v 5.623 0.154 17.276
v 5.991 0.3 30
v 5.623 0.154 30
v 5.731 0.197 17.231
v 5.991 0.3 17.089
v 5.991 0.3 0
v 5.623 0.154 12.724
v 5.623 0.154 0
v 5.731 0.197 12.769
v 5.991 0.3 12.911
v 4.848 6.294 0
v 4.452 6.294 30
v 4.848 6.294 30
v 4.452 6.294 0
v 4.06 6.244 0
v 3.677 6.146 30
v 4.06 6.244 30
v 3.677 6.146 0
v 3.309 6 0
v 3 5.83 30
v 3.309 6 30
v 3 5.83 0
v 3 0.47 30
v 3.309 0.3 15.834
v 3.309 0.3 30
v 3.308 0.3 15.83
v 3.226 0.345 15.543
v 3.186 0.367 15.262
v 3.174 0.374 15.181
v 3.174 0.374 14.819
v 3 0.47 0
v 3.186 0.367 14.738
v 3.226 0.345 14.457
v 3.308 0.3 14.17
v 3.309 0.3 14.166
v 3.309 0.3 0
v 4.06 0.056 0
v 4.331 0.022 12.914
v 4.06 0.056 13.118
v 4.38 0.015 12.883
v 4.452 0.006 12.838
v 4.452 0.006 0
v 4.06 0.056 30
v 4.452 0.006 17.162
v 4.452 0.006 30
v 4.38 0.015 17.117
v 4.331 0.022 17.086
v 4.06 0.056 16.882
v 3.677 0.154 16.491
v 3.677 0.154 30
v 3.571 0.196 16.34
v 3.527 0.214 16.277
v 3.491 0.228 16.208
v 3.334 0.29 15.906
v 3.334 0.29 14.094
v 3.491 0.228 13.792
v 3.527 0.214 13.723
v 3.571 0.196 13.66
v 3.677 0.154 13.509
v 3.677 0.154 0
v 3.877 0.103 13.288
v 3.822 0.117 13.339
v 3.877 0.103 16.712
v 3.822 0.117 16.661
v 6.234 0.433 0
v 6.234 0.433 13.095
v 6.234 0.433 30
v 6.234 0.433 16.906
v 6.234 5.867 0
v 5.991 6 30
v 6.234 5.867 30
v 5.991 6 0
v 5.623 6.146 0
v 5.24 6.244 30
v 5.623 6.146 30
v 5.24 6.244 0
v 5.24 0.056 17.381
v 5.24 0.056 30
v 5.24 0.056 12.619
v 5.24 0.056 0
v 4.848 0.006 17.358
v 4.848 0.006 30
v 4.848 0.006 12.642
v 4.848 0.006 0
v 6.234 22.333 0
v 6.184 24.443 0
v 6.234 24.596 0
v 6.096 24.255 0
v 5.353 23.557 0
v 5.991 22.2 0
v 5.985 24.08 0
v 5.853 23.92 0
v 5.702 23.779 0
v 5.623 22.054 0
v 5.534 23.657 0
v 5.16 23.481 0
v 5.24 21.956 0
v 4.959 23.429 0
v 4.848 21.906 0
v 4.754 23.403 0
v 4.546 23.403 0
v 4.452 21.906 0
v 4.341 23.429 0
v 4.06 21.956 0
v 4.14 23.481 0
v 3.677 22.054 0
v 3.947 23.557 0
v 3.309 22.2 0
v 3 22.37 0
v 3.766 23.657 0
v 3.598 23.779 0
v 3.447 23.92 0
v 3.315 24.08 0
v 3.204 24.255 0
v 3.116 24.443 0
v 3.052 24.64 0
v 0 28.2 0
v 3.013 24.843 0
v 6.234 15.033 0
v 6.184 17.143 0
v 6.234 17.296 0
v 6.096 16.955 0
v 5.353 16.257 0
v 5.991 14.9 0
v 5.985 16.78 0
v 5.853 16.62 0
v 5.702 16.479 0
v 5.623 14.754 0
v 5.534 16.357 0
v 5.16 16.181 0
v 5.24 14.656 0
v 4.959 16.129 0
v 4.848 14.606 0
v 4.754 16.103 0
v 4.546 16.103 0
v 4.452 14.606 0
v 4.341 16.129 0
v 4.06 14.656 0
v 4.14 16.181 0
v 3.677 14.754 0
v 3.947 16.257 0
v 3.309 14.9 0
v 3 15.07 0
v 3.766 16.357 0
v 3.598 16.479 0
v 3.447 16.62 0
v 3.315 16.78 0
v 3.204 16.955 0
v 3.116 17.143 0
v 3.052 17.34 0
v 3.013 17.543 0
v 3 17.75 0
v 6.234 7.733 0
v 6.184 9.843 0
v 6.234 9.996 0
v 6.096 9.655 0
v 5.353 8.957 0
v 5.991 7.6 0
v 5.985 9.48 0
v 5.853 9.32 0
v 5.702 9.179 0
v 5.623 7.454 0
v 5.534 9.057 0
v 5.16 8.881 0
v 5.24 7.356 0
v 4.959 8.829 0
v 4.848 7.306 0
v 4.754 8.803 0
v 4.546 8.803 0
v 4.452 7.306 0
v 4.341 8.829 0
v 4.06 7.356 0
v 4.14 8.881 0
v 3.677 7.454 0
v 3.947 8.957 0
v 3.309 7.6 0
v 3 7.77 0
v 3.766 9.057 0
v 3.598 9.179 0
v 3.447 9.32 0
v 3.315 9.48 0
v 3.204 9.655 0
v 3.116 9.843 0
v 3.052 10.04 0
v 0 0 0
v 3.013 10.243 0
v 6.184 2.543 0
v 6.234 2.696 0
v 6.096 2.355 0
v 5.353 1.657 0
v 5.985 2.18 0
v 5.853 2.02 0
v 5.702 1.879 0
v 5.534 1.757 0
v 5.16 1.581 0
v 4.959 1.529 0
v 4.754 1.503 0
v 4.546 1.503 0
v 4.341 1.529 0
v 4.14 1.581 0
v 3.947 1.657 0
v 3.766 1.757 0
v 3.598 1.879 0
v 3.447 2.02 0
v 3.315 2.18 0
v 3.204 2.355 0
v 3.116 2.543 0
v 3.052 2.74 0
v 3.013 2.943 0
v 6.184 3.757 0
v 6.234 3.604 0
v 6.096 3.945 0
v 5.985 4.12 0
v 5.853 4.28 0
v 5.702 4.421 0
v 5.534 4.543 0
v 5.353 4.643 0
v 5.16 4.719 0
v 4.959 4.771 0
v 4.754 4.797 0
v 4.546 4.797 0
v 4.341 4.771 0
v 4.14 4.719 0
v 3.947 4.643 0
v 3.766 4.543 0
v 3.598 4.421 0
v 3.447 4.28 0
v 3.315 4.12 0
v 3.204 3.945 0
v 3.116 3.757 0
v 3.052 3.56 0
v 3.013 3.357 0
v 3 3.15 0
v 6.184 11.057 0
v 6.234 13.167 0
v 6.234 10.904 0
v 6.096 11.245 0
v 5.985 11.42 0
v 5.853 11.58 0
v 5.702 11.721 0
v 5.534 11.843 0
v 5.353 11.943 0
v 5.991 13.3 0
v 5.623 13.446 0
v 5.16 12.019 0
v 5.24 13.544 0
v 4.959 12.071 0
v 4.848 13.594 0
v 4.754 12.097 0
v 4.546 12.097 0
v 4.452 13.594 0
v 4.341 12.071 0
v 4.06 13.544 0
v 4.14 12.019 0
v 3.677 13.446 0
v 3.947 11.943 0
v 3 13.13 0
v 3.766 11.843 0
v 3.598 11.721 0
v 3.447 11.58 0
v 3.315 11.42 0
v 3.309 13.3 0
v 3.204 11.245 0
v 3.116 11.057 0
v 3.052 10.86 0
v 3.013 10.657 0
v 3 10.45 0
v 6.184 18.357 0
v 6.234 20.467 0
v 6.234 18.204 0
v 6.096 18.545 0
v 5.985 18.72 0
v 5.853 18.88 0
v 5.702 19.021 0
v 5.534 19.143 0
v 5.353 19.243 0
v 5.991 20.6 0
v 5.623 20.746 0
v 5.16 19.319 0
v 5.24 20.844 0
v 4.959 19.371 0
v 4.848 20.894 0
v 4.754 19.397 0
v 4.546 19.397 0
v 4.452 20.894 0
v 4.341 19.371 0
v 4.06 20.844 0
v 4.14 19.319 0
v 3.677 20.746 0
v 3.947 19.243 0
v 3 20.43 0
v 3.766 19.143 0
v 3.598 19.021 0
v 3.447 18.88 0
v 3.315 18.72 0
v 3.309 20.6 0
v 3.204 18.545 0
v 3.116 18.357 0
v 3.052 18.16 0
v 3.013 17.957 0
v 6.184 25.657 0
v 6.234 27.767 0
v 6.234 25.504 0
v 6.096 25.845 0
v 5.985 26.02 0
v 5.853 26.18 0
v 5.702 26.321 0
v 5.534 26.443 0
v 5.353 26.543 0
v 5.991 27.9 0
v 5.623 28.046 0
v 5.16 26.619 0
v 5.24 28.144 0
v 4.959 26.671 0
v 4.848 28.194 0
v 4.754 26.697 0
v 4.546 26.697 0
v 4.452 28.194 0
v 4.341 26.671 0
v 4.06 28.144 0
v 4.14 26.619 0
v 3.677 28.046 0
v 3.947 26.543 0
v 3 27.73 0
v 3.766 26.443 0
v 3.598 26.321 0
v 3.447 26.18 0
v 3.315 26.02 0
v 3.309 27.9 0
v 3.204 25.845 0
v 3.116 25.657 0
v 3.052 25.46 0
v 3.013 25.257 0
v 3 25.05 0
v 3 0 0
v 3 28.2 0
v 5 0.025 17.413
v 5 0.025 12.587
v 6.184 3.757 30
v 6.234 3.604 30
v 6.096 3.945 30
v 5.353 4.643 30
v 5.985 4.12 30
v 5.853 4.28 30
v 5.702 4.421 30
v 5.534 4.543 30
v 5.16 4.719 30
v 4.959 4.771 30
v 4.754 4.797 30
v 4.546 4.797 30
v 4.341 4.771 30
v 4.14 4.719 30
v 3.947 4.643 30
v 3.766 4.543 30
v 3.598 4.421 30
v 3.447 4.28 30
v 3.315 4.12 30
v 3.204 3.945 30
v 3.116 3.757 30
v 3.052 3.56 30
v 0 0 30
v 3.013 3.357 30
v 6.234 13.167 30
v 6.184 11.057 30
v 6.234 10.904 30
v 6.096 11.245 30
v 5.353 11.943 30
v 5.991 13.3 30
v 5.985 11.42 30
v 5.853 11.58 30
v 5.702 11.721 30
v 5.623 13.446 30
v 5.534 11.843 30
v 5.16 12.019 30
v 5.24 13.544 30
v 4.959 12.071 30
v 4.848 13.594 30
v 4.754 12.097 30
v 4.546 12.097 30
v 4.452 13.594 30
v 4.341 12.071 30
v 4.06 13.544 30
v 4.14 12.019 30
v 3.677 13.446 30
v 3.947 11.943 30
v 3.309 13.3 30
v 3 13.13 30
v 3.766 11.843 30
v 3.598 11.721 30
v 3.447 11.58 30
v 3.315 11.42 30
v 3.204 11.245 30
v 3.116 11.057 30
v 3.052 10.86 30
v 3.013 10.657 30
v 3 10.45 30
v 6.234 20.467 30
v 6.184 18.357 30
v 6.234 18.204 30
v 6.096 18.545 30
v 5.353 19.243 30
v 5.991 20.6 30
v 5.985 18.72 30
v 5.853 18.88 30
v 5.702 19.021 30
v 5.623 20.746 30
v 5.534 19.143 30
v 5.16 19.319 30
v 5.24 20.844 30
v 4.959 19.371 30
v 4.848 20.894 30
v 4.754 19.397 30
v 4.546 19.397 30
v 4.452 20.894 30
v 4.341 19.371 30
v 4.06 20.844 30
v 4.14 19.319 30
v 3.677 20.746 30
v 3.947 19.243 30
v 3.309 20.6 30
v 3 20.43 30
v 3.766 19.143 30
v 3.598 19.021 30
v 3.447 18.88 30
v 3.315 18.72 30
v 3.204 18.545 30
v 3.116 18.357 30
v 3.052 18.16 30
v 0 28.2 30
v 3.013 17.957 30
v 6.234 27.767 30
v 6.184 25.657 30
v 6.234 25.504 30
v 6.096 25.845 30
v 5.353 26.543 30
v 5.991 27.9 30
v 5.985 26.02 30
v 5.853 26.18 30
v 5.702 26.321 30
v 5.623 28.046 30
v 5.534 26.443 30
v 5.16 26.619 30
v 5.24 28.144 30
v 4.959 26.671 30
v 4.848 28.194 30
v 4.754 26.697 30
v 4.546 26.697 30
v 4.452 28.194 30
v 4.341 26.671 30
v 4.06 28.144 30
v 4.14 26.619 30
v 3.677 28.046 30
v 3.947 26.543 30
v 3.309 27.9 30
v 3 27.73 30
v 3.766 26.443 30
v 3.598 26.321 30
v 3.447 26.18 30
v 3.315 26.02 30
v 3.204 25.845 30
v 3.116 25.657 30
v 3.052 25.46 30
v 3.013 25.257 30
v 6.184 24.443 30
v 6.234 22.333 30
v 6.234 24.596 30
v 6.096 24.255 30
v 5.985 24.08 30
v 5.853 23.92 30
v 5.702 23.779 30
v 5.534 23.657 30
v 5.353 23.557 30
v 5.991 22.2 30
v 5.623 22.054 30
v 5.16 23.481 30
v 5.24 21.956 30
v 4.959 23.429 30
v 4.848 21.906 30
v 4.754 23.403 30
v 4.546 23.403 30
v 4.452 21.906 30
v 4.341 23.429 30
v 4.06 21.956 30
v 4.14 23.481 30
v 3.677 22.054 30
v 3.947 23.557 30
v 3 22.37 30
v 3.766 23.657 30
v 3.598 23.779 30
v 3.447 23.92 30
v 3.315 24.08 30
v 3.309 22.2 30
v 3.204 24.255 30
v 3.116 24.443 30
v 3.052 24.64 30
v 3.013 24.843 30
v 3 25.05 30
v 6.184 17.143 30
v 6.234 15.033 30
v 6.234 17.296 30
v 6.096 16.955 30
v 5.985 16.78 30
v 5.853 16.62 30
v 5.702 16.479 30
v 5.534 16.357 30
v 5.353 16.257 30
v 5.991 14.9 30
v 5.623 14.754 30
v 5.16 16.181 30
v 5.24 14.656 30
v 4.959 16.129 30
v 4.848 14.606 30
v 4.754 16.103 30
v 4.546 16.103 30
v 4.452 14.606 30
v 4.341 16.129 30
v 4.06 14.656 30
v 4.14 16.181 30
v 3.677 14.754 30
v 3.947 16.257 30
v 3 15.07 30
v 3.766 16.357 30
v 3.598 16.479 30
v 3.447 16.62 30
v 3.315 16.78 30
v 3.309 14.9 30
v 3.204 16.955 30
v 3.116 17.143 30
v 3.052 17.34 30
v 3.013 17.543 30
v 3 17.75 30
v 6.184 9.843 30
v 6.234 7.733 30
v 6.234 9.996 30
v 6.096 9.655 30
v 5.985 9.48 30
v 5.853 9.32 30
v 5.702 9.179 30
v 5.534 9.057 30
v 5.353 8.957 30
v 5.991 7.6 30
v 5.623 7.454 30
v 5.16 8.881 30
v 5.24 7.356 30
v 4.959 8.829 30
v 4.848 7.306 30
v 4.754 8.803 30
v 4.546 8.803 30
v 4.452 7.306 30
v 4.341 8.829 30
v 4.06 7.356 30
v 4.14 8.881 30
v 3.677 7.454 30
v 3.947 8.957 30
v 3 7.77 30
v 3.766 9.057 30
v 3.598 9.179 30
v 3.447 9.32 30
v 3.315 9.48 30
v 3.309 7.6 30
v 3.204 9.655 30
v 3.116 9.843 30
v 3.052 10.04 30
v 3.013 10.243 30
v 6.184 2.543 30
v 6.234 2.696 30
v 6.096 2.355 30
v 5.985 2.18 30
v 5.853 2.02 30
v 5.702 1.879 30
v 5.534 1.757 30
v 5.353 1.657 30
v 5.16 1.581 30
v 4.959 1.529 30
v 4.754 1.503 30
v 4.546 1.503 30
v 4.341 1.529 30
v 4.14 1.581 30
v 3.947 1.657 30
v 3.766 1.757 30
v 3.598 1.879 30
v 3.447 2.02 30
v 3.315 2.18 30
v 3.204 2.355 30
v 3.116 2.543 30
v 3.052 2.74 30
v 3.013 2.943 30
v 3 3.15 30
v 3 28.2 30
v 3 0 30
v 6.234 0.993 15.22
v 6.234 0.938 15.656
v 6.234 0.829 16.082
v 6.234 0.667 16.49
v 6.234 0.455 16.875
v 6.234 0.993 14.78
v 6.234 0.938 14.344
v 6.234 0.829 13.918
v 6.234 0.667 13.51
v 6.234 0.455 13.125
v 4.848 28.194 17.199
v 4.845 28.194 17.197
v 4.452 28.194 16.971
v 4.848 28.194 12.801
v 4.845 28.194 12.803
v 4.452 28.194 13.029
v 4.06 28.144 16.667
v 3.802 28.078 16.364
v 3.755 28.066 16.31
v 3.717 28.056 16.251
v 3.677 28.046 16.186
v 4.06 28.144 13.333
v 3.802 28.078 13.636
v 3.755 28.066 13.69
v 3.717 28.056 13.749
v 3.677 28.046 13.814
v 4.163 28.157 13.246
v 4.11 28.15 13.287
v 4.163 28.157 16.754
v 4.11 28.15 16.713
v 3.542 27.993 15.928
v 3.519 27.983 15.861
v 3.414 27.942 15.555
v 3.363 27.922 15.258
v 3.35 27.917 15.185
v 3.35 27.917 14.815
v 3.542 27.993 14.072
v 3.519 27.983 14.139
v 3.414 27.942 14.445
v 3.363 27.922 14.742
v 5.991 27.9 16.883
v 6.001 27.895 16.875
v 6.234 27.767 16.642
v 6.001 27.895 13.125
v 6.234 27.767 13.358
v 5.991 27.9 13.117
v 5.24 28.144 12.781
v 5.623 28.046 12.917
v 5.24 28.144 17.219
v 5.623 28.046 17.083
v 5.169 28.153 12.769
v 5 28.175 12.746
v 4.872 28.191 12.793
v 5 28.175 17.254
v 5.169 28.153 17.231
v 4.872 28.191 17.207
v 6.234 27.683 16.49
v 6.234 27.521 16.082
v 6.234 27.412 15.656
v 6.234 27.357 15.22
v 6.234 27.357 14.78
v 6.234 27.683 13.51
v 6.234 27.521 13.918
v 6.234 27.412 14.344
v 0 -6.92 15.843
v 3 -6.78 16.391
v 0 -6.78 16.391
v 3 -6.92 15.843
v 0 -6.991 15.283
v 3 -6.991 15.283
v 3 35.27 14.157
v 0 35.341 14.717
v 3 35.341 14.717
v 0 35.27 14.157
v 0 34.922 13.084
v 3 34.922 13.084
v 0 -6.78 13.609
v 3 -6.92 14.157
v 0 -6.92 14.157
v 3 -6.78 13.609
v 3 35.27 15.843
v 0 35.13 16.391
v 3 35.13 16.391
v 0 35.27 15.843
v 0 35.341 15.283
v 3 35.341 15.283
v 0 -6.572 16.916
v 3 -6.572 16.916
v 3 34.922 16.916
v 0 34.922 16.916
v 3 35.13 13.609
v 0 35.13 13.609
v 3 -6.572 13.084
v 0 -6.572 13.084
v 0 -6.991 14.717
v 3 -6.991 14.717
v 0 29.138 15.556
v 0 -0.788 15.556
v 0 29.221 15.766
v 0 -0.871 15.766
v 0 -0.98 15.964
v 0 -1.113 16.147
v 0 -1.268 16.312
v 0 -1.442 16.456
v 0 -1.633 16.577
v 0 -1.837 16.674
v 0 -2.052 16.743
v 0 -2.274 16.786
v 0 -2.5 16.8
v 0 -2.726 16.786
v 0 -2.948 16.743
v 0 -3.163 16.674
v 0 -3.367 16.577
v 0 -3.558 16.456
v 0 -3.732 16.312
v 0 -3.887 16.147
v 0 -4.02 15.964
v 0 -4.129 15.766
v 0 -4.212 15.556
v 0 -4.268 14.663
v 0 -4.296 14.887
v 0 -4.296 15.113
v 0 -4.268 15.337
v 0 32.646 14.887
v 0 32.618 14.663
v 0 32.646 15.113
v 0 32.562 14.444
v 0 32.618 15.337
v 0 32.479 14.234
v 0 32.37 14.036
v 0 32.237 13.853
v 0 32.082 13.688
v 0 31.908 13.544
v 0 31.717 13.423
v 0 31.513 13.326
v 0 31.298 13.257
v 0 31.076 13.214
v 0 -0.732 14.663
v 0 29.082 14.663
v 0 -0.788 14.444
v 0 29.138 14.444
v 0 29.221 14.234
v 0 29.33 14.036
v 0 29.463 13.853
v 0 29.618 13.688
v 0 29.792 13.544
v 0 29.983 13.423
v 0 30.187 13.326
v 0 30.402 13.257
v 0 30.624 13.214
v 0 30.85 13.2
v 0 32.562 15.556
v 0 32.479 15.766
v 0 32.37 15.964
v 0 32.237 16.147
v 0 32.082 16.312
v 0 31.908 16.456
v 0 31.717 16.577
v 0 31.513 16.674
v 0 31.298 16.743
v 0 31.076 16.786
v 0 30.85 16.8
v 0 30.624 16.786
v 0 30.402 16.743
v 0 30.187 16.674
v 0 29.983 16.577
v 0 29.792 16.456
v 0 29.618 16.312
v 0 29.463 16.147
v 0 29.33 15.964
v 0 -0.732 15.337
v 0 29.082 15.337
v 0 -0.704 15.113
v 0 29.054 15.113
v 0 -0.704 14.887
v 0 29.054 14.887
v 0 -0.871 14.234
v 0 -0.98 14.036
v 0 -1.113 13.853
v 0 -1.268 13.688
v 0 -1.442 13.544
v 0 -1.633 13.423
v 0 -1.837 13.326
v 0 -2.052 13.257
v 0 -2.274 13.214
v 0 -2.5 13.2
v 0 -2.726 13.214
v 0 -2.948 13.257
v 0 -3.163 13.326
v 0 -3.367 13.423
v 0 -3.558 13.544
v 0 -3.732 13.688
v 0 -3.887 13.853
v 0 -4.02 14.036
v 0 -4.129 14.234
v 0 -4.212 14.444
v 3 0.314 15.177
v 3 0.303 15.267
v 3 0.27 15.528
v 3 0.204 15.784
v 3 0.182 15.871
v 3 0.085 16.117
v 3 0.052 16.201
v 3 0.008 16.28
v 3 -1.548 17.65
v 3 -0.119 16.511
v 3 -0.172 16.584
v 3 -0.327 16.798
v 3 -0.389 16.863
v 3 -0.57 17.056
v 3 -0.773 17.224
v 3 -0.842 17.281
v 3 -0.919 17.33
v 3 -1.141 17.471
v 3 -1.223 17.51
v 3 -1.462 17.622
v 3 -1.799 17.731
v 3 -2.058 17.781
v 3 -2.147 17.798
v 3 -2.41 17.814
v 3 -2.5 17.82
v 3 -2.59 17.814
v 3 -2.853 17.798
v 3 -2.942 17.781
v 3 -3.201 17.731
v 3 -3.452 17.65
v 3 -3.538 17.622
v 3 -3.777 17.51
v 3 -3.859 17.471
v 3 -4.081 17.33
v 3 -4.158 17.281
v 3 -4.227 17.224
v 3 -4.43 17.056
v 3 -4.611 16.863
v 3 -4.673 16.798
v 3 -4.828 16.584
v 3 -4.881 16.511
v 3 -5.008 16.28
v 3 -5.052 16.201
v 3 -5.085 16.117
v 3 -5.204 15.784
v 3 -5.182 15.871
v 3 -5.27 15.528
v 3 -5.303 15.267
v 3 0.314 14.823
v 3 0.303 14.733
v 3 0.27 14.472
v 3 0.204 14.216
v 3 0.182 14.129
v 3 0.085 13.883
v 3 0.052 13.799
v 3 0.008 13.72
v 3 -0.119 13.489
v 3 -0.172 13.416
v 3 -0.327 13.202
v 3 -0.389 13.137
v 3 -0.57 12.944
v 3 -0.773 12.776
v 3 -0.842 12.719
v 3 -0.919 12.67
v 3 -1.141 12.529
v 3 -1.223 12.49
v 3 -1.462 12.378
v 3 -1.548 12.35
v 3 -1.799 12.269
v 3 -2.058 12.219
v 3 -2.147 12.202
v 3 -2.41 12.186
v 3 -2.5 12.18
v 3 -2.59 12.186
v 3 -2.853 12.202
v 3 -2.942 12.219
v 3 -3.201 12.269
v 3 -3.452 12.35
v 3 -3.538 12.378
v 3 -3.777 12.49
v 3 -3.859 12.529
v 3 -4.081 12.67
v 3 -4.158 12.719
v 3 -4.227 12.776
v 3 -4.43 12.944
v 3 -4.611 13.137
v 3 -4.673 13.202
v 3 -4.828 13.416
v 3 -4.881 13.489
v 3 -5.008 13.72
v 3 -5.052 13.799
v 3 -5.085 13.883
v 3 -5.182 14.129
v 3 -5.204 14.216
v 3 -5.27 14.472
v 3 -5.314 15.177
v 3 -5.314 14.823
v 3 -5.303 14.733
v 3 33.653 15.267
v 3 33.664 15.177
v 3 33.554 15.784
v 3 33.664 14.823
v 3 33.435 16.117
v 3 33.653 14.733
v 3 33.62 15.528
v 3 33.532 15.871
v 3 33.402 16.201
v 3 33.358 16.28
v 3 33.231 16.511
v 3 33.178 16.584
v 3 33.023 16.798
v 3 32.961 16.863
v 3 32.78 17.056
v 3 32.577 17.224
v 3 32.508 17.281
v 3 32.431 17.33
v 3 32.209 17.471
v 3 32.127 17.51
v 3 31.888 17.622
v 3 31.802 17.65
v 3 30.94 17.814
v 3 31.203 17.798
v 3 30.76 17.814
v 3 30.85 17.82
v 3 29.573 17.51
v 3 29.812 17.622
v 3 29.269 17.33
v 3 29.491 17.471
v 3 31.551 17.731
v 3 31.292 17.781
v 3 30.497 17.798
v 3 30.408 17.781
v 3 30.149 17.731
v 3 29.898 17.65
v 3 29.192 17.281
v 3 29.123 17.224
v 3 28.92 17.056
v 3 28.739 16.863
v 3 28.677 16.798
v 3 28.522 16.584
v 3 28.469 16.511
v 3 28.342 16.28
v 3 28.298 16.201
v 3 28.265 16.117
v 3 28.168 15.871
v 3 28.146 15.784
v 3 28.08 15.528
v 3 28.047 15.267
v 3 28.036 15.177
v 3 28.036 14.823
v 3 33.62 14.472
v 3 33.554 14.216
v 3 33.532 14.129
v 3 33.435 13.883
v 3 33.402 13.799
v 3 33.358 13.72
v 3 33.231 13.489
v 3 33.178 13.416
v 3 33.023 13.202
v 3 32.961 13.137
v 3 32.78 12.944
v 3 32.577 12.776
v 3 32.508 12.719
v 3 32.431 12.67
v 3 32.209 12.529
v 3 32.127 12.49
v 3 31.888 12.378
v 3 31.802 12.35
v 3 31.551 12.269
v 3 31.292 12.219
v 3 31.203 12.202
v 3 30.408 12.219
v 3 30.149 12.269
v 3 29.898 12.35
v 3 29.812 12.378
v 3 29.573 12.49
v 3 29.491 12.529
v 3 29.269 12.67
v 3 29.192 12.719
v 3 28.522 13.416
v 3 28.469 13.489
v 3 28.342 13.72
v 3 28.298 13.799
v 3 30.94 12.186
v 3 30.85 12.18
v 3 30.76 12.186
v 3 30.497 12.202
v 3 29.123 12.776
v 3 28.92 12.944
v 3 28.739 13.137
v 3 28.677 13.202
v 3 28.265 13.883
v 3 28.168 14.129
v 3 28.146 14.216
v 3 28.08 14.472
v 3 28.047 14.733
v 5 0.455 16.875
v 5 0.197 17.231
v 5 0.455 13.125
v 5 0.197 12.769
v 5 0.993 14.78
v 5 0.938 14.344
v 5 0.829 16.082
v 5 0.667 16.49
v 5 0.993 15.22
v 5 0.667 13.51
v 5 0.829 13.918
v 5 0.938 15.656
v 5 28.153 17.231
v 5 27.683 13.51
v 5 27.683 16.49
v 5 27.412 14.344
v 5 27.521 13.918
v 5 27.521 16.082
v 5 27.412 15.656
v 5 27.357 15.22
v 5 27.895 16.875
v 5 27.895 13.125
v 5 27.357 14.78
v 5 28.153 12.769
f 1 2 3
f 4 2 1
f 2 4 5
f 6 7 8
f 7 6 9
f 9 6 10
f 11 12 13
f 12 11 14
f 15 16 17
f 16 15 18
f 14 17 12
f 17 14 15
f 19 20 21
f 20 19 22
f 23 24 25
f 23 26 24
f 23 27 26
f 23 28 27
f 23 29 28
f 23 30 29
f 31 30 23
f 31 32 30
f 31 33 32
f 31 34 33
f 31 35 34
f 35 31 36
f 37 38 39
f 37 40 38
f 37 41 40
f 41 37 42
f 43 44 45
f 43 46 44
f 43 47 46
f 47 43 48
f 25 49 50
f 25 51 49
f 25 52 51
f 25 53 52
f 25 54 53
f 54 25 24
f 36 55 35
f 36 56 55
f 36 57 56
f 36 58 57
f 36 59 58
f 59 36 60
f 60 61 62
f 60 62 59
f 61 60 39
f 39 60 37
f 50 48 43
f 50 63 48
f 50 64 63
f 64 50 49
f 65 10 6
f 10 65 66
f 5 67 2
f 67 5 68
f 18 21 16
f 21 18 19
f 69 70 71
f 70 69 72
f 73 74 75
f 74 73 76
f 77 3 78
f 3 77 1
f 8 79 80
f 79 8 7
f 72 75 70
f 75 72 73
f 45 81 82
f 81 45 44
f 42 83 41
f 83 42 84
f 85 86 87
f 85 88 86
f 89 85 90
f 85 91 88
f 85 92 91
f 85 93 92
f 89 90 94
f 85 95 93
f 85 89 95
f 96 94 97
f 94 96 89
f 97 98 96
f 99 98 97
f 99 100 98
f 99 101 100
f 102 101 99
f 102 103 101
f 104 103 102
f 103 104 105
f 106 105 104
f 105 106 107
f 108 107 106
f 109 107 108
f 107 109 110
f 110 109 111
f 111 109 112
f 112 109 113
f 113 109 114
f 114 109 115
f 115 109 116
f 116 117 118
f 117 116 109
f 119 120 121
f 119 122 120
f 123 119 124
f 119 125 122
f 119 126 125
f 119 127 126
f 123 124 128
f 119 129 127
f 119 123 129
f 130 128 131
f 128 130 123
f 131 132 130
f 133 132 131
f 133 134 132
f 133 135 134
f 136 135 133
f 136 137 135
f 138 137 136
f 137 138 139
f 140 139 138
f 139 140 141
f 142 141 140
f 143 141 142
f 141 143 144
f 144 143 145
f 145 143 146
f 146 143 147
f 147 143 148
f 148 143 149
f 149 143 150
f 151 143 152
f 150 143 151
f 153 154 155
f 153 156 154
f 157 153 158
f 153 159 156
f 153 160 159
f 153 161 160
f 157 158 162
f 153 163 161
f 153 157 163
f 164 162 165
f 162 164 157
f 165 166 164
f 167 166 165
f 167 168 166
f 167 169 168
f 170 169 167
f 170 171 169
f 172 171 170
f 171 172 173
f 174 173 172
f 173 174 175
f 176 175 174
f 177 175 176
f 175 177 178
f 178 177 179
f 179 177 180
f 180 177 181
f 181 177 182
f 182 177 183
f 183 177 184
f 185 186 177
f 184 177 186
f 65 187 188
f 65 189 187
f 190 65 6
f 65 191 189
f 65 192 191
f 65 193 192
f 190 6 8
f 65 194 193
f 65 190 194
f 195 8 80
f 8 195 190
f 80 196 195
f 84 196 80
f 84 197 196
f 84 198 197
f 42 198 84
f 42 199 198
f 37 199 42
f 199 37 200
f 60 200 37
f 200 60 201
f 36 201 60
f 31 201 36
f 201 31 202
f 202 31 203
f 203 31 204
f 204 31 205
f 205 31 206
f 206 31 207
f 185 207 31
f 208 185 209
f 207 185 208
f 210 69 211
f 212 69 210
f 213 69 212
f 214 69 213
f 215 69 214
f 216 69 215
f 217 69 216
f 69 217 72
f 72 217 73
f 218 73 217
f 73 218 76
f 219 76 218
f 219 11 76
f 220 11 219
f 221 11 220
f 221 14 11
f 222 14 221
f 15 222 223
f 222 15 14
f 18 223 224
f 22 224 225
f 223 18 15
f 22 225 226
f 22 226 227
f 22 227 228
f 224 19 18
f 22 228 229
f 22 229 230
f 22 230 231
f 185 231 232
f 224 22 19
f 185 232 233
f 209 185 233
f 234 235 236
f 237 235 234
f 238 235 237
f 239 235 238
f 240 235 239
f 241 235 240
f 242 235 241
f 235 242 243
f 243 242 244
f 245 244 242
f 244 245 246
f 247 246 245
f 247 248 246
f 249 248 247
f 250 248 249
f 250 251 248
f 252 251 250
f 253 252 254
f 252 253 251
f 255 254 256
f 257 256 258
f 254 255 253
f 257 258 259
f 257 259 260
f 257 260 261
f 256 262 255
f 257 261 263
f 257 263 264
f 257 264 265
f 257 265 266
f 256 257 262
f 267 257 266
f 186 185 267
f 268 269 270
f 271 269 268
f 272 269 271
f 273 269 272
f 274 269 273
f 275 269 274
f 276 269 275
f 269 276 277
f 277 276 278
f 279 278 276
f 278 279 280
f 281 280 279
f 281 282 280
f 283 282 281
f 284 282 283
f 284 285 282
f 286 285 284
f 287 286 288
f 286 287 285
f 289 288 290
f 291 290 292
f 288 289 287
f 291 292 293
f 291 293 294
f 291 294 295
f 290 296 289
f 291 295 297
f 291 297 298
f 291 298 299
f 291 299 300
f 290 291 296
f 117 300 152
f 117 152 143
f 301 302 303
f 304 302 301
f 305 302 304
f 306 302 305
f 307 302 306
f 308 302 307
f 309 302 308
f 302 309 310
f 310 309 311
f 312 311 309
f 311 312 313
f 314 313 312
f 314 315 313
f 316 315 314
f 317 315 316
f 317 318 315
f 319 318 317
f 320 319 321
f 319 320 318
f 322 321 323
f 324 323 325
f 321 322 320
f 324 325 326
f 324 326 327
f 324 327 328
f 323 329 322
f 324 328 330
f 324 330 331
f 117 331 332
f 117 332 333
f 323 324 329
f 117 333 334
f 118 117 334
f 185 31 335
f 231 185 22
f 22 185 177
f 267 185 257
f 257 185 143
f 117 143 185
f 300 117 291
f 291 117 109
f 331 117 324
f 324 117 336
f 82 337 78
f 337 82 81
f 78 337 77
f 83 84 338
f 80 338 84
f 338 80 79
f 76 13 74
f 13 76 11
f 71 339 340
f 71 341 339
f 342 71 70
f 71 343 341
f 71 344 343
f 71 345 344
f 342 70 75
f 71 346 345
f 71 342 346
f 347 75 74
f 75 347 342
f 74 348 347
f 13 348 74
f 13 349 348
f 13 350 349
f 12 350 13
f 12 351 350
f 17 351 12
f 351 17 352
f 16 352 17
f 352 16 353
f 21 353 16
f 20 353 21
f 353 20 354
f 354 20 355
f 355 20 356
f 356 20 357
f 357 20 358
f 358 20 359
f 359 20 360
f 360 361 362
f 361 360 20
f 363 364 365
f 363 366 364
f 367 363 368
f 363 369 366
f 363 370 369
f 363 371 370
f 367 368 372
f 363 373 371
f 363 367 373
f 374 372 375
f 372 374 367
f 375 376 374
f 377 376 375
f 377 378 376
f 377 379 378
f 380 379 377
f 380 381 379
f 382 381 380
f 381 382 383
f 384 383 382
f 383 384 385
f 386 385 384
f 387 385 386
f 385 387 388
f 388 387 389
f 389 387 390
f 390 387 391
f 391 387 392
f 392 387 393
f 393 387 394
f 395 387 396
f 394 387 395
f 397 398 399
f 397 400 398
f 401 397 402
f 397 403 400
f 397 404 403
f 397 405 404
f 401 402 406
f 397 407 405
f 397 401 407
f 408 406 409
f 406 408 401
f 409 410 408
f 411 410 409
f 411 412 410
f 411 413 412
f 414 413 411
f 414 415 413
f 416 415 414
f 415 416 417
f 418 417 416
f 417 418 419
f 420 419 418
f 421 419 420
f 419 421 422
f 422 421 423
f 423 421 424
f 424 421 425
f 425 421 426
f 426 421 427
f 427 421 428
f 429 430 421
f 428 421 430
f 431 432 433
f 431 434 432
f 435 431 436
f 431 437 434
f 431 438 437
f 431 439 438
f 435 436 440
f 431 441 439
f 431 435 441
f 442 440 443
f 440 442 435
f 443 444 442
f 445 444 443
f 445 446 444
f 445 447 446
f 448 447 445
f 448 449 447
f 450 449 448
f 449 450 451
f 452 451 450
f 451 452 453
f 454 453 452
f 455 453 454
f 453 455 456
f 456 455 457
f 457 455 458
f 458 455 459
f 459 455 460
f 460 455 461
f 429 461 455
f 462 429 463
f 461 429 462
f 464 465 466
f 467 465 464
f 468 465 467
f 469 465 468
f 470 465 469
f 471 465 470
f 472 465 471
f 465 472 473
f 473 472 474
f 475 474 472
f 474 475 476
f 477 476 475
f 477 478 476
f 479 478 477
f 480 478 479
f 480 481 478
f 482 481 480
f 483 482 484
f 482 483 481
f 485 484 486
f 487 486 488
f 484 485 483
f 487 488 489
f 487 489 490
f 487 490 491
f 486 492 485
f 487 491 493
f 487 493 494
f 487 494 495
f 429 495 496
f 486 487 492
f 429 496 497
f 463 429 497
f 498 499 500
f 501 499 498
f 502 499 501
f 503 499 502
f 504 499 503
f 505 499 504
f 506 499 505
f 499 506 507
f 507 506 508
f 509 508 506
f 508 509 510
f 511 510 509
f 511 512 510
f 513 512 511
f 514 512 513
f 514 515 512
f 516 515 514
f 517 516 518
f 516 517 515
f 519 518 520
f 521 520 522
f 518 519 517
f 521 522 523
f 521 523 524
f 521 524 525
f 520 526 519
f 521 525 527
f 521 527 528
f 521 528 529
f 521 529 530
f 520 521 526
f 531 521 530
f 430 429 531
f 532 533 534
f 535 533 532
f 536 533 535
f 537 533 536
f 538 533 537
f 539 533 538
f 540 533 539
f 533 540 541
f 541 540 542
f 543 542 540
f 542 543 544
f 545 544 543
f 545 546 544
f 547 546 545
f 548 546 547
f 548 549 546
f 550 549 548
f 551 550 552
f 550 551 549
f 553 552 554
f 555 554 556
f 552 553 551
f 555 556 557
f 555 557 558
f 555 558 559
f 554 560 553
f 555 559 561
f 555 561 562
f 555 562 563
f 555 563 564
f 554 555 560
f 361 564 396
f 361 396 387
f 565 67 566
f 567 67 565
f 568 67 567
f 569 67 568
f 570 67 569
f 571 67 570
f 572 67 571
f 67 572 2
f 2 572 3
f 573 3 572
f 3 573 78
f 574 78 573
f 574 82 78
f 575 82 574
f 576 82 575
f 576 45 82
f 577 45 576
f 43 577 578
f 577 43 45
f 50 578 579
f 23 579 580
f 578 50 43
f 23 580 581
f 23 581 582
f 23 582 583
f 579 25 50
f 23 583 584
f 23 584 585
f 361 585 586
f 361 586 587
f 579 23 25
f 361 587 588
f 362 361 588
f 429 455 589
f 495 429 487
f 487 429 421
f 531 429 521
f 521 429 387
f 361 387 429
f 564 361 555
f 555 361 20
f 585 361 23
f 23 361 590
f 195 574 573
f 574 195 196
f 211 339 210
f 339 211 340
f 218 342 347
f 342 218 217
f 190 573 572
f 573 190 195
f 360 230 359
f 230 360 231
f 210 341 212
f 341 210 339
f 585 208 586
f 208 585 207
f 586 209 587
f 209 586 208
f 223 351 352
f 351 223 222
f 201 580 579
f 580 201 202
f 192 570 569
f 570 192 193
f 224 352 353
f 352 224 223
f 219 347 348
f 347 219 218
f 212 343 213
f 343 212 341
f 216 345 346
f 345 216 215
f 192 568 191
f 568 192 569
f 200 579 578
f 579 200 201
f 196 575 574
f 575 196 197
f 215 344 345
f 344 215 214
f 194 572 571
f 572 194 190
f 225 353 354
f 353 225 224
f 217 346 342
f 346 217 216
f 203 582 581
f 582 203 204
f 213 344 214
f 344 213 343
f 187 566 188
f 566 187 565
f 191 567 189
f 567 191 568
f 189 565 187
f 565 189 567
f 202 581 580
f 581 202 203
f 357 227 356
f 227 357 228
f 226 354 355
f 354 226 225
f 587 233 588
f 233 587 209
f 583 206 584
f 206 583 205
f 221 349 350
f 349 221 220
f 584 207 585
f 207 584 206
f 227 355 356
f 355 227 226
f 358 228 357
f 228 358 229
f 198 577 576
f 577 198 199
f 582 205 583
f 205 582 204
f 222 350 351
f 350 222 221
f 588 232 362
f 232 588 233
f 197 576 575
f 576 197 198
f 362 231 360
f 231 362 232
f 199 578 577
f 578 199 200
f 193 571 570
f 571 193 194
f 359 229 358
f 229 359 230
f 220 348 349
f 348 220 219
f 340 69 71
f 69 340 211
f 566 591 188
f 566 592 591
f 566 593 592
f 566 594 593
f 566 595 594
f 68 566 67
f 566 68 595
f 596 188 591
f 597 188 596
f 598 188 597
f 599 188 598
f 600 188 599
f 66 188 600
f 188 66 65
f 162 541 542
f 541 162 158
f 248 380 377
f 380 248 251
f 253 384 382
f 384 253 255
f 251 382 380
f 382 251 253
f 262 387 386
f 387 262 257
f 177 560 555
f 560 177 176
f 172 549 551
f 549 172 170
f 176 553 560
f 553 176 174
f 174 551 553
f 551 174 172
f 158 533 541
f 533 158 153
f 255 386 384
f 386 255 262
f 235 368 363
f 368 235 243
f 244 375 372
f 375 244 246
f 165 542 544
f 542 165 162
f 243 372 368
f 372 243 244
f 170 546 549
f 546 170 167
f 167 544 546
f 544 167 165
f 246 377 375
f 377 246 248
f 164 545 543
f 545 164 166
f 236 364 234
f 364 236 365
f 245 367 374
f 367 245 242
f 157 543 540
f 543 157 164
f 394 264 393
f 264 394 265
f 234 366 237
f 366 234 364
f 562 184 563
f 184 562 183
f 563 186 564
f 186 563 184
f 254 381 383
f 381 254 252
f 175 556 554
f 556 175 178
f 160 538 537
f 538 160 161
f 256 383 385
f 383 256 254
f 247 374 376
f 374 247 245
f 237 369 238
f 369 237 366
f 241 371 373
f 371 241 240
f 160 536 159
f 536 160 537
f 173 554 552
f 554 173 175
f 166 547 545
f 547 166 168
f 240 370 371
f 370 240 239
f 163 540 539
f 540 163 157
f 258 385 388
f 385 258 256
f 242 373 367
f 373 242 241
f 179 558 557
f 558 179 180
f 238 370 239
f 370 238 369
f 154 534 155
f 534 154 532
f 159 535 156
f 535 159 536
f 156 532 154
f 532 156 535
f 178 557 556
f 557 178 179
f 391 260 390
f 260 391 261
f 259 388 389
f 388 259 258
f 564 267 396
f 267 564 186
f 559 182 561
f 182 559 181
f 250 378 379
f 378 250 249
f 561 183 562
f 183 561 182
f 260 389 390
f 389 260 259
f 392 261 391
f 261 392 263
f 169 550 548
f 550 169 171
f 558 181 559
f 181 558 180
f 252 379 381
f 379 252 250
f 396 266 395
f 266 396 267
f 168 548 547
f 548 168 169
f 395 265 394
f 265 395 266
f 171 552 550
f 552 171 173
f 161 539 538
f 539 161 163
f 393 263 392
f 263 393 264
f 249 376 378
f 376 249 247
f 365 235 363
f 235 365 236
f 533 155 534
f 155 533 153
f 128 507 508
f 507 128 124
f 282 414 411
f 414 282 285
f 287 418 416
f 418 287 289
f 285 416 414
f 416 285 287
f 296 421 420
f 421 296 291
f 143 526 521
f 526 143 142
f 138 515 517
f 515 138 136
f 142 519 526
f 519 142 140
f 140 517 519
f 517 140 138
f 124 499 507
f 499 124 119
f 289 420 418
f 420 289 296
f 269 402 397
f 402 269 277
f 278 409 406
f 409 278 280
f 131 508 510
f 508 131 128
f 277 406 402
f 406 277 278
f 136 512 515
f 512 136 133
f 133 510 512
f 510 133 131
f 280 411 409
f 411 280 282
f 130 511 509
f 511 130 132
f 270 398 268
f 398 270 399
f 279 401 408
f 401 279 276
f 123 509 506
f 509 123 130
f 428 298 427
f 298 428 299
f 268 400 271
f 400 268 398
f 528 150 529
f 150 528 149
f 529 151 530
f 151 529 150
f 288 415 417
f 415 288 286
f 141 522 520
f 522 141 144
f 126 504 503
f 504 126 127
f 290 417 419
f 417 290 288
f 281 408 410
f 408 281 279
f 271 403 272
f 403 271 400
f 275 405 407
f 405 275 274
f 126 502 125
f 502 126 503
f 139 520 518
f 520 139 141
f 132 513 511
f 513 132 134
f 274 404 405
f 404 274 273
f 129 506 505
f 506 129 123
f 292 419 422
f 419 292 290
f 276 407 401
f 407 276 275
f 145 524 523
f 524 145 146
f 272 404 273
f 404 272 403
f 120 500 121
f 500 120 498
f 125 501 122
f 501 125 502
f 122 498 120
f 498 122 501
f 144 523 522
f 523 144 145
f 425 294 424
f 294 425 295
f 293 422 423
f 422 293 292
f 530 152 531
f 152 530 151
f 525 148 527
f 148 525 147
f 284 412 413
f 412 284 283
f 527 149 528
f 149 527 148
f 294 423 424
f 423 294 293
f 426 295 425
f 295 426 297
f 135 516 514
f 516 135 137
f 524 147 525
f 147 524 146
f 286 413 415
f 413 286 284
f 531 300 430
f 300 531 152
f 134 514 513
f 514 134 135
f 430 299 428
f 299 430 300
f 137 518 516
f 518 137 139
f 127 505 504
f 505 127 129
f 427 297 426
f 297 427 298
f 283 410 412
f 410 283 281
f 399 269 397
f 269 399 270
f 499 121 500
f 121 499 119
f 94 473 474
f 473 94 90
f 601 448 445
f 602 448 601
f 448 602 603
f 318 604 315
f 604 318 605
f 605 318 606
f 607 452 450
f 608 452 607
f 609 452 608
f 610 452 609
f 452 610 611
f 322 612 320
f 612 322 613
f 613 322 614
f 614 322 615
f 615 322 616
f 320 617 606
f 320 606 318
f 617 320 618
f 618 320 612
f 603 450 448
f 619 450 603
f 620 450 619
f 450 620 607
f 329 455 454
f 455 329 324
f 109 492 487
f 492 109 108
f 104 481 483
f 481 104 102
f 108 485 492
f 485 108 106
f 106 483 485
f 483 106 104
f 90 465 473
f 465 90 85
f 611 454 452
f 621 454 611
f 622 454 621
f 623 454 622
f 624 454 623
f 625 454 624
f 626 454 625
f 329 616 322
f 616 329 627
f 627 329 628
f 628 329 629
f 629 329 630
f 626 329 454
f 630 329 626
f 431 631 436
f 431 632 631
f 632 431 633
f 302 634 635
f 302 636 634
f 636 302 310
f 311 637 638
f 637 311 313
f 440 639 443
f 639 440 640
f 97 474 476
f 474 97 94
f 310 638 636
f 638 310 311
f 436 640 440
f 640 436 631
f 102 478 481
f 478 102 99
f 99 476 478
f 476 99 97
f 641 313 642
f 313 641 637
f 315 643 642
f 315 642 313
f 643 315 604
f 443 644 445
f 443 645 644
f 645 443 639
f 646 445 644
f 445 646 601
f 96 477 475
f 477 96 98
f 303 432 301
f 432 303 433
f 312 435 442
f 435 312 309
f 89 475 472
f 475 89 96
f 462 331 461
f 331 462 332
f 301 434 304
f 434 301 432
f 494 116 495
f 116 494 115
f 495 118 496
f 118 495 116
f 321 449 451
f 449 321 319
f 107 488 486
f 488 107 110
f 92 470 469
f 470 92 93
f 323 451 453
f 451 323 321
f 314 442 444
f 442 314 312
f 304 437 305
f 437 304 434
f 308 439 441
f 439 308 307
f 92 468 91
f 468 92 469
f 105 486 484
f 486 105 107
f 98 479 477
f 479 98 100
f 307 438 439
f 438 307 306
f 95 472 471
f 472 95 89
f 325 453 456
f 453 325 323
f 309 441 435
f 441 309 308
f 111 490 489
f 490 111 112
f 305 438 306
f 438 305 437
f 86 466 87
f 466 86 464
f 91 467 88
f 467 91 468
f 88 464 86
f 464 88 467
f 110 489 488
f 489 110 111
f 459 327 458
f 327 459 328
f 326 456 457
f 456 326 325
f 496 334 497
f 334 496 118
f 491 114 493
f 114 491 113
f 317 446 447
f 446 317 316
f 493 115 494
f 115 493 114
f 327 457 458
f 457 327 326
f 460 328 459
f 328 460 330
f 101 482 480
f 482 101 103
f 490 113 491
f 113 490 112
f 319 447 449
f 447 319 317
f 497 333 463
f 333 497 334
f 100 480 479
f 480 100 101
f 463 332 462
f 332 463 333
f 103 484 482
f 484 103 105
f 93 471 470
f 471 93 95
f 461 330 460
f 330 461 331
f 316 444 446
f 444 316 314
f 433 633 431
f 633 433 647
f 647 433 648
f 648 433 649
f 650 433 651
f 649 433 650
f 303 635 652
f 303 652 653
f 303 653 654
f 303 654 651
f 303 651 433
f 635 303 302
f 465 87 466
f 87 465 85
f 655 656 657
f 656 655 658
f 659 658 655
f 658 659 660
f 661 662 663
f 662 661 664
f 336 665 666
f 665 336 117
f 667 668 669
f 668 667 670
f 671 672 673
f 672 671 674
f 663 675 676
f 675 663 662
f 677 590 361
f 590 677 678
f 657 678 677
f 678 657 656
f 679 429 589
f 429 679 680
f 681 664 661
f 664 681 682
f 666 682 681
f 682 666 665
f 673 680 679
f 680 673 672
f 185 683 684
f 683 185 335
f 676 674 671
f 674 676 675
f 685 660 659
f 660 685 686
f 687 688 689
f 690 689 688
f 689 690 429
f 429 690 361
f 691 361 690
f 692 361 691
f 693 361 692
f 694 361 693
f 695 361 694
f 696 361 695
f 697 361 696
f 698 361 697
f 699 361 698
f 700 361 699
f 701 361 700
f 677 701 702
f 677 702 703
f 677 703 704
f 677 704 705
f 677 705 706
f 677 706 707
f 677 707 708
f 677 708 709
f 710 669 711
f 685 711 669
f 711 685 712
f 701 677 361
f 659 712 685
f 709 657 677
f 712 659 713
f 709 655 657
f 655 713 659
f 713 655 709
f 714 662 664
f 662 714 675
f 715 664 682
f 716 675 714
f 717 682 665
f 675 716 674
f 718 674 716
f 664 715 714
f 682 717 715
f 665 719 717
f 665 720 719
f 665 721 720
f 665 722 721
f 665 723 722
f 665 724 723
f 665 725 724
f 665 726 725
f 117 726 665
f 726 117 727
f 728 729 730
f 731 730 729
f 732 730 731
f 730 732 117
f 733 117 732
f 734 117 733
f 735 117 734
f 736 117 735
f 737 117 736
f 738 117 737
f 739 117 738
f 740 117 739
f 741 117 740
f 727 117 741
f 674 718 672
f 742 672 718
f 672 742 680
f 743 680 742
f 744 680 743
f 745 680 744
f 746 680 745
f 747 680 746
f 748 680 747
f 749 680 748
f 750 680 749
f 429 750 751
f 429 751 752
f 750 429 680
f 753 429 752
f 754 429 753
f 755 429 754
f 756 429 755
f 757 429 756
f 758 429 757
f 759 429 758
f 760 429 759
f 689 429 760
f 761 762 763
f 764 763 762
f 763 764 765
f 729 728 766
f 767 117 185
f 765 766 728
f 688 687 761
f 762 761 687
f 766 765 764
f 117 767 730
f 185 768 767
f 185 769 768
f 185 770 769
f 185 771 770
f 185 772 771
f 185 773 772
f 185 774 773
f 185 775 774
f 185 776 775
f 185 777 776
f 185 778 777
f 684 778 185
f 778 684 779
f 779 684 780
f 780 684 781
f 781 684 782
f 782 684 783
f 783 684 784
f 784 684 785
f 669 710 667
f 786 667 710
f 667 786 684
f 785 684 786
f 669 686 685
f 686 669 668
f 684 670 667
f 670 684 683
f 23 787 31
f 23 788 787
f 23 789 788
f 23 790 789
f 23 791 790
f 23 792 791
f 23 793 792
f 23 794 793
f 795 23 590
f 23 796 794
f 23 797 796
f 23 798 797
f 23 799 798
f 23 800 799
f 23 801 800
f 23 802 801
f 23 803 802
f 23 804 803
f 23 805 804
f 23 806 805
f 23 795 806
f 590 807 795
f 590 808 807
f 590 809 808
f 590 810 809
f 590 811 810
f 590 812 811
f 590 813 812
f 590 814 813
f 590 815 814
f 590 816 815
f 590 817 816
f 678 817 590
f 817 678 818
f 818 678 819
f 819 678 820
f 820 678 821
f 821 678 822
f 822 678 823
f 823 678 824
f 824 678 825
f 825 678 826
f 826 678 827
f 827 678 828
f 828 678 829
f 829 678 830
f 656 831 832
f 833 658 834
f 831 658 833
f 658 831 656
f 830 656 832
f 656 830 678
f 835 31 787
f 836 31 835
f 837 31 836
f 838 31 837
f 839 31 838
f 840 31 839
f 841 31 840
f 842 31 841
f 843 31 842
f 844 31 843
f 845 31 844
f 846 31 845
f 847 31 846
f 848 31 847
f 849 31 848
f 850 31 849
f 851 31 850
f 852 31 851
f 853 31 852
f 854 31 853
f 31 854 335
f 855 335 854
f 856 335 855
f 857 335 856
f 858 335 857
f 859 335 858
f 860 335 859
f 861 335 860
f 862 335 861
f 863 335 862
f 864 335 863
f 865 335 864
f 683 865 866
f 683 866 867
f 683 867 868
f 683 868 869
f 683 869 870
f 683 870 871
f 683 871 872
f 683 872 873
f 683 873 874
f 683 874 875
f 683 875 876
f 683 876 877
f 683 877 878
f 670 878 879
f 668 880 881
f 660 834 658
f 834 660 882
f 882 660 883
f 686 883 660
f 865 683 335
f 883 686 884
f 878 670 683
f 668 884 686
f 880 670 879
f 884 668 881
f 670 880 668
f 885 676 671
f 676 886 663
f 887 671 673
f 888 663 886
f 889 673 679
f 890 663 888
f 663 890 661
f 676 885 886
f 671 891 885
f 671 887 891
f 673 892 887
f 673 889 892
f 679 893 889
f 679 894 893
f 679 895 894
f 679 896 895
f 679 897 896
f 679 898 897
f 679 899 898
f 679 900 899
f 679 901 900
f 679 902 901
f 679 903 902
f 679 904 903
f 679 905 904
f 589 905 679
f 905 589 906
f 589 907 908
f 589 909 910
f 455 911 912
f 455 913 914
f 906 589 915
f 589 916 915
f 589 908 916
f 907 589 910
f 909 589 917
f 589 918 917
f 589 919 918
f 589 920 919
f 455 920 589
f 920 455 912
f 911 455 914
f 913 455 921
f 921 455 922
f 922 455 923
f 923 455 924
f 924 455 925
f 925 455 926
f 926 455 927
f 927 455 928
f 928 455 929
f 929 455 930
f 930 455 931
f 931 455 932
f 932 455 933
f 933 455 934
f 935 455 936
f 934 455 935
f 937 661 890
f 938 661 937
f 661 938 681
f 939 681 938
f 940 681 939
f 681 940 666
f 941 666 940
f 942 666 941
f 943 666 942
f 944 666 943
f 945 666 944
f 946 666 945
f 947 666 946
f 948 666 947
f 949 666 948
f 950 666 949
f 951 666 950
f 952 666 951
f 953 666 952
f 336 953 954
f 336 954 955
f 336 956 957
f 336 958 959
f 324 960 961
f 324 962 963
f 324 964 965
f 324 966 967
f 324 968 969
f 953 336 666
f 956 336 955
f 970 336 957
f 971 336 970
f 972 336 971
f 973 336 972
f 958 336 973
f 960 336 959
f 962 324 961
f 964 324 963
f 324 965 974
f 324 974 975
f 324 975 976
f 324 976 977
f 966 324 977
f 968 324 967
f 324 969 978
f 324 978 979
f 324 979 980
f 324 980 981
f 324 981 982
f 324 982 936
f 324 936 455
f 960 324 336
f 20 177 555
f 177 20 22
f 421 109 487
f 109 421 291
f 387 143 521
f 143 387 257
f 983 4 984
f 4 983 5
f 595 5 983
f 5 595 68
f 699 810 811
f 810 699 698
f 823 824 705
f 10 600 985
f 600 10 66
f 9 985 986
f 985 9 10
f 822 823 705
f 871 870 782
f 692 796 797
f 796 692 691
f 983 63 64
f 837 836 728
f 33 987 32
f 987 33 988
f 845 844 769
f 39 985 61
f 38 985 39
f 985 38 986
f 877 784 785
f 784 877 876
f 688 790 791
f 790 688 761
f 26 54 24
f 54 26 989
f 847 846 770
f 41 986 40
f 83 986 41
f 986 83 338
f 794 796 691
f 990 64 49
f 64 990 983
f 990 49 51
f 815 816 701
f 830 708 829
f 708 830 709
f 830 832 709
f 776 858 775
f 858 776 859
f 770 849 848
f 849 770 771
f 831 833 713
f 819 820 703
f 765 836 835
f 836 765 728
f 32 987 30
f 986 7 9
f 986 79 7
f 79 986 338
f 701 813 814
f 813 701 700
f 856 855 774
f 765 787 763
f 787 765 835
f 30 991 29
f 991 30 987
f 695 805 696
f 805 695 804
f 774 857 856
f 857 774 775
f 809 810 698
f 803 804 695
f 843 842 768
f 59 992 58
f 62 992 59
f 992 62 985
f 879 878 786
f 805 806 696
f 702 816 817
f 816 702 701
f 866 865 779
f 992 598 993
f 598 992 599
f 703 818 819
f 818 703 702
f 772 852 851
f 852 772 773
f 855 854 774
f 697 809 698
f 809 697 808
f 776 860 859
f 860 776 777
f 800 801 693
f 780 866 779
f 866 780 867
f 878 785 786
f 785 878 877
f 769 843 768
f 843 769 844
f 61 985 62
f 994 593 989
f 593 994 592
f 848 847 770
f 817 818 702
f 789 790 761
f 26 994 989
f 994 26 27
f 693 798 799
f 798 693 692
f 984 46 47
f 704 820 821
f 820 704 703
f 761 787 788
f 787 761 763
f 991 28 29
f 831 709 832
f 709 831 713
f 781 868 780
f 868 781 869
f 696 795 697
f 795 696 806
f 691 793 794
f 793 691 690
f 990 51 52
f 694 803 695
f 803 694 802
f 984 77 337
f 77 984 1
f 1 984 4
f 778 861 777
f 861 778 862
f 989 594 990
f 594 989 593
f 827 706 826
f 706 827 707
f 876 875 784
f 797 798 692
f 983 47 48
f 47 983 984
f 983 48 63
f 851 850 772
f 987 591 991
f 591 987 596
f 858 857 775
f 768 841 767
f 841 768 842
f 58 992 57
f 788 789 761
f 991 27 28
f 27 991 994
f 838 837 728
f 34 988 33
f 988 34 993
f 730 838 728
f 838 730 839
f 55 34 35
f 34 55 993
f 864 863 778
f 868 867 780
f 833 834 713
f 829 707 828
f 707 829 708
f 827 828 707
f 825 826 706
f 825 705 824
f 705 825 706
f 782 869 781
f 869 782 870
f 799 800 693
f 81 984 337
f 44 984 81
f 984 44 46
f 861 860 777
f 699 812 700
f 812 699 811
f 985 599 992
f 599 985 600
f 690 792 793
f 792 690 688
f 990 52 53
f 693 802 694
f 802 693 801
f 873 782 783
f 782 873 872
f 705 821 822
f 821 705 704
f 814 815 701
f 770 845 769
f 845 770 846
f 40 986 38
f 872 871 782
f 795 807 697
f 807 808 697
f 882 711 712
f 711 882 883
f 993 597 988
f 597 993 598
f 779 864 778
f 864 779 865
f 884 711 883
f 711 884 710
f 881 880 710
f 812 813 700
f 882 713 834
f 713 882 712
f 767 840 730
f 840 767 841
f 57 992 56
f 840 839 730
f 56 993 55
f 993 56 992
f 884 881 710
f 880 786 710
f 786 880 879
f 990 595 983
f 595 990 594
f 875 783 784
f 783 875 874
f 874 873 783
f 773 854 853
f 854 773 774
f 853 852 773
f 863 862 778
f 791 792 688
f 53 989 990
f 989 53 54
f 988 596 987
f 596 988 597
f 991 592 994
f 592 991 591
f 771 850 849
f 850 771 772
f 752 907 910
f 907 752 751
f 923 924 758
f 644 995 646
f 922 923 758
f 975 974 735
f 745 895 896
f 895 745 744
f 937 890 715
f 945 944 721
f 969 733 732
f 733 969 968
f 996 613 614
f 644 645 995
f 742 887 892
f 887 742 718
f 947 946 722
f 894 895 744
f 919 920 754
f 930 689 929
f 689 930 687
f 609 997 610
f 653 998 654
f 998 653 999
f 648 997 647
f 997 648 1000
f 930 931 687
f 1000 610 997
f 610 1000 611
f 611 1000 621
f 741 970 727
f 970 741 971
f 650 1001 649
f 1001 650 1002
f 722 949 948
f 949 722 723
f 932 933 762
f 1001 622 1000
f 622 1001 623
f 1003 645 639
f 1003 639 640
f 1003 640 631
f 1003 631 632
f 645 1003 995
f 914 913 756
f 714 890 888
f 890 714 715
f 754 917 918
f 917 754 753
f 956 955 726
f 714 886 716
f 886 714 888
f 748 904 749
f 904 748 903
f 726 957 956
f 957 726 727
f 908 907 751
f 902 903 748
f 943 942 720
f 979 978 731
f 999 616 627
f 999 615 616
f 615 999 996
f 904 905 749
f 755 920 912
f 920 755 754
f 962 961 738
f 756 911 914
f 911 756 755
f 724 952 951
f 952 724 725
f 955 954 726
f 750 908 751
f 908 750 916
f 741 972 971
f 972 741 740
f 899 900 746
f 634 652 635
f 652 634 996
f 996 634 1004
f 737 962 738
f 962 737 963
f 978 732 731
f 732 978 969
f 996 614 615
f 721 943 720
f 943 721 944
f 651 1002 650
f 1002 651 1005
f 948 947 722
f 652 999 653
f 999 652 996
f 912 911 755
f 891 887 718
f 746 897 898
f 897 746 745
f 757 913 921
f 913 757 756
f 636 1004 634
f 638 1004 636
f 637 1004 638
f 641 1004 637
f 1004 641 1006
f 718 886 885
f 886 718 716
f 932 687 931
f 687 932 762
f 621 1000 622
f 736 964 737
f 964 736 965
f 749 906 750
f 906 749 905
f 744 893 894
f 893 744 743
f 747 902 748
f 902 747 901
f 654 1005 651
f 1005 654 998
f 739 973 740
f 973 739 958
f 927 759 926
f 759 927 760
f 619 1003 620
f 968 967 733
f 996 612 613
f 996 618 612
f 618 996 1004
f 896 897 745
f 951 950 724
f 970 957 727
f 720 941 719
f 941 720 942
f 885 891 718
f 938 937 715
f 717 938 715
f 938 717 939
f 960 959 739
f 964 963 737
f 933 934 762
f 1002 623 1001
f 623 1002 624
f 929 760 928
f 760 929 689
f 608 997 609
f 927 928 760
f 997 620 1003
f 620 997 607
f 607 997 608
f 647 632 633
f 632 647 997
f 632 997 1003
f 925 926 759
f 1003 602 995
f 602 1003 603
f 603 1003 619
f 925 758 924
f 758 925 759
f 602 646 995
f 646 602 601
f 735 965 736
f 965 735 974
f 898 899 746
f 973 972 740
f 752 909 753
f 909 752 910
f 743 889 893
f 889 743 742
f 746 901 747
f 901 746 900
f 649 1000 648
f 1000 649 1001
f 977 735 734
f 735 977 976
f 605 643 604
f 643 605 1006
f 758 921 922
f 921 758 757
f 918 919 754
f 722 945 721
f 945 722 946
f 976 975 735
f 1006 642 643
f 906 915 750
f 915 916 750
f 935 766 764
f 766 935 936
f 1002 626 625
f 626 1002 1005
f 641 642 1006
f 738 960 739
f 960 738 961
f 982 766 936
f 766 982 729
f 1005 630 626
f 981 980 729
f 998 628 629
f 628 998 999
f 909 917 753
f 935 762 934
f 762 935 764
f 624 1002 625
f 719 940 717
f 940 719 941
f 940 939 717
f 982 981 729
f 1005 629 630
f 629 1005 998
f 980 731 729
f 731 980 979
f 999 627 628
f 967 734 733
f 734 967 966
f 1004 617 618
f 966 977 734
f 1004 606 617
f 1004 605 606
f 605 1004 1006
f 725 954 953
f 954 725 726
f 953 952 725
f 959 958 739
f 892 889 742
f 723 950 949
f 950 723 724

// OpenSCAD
tube_count=4; // [1:20]
tube_dia=3.3;
tube_length=30; // [10:60]
tube_gap=1;

grip=0.98;
strength=1.5;
base=3;
screwholes = true;

/* [Hidden] */
$fn=50;

tube_width=tube_dia+2*strength;

module schelle() {
difference() {
    cylinder(d=tube_width,h=tube_length);
    cylinder(d=tube_dia,h=tube_length);
    translate([tube_dia*(grip-0.5),-tube_width/2,0]) cube([tube_width,tube_width,tube_length]);
}
}

module schraube() {
color("green")
 {
 translate([0,0,25])    
 cylinder(d=3.6,h=20);
 hull() {    
 translate([0,0,20])    
 cylinder(d=3.6,h=5);
 translate([0,0,-60])    
 cylinder(d=7,h=80);
 }
 }
}

difference() {
    union() {
     hull() {
      cube([base,tube_count*tube_width+(tube_count-1)*tube_gap,tube_length]);
    if (screwholes) {     
    translate([0,-2.5,tube_length/2]) rotate([0,90,0]) cylinder(d=9,h=base);   
    translate([0,tube_width*(tube_count+.5)+(tube_count+1)*tube_gap-2.5,tube_length/2]) rotate([0,90,0]) cylinder(d=9,h=base);
    }   
     }
    for(i=[0:tube_count-1])
      translate([tube_width/2+base-strength,tube_width/2+i*(tube_width+tube_gap),0]) schelle();
    }
    if (screwholes) {
    translate([25,-2.5,tube_length/2]) rotate([0,-90,0]) schraube();
    translate([25,tube_width*(tube_count+.5)+(tube_count+1)*tube_gap-2.5,tube_length/2]) rotate([0,-90,0]) schraube();
    }
}
 
